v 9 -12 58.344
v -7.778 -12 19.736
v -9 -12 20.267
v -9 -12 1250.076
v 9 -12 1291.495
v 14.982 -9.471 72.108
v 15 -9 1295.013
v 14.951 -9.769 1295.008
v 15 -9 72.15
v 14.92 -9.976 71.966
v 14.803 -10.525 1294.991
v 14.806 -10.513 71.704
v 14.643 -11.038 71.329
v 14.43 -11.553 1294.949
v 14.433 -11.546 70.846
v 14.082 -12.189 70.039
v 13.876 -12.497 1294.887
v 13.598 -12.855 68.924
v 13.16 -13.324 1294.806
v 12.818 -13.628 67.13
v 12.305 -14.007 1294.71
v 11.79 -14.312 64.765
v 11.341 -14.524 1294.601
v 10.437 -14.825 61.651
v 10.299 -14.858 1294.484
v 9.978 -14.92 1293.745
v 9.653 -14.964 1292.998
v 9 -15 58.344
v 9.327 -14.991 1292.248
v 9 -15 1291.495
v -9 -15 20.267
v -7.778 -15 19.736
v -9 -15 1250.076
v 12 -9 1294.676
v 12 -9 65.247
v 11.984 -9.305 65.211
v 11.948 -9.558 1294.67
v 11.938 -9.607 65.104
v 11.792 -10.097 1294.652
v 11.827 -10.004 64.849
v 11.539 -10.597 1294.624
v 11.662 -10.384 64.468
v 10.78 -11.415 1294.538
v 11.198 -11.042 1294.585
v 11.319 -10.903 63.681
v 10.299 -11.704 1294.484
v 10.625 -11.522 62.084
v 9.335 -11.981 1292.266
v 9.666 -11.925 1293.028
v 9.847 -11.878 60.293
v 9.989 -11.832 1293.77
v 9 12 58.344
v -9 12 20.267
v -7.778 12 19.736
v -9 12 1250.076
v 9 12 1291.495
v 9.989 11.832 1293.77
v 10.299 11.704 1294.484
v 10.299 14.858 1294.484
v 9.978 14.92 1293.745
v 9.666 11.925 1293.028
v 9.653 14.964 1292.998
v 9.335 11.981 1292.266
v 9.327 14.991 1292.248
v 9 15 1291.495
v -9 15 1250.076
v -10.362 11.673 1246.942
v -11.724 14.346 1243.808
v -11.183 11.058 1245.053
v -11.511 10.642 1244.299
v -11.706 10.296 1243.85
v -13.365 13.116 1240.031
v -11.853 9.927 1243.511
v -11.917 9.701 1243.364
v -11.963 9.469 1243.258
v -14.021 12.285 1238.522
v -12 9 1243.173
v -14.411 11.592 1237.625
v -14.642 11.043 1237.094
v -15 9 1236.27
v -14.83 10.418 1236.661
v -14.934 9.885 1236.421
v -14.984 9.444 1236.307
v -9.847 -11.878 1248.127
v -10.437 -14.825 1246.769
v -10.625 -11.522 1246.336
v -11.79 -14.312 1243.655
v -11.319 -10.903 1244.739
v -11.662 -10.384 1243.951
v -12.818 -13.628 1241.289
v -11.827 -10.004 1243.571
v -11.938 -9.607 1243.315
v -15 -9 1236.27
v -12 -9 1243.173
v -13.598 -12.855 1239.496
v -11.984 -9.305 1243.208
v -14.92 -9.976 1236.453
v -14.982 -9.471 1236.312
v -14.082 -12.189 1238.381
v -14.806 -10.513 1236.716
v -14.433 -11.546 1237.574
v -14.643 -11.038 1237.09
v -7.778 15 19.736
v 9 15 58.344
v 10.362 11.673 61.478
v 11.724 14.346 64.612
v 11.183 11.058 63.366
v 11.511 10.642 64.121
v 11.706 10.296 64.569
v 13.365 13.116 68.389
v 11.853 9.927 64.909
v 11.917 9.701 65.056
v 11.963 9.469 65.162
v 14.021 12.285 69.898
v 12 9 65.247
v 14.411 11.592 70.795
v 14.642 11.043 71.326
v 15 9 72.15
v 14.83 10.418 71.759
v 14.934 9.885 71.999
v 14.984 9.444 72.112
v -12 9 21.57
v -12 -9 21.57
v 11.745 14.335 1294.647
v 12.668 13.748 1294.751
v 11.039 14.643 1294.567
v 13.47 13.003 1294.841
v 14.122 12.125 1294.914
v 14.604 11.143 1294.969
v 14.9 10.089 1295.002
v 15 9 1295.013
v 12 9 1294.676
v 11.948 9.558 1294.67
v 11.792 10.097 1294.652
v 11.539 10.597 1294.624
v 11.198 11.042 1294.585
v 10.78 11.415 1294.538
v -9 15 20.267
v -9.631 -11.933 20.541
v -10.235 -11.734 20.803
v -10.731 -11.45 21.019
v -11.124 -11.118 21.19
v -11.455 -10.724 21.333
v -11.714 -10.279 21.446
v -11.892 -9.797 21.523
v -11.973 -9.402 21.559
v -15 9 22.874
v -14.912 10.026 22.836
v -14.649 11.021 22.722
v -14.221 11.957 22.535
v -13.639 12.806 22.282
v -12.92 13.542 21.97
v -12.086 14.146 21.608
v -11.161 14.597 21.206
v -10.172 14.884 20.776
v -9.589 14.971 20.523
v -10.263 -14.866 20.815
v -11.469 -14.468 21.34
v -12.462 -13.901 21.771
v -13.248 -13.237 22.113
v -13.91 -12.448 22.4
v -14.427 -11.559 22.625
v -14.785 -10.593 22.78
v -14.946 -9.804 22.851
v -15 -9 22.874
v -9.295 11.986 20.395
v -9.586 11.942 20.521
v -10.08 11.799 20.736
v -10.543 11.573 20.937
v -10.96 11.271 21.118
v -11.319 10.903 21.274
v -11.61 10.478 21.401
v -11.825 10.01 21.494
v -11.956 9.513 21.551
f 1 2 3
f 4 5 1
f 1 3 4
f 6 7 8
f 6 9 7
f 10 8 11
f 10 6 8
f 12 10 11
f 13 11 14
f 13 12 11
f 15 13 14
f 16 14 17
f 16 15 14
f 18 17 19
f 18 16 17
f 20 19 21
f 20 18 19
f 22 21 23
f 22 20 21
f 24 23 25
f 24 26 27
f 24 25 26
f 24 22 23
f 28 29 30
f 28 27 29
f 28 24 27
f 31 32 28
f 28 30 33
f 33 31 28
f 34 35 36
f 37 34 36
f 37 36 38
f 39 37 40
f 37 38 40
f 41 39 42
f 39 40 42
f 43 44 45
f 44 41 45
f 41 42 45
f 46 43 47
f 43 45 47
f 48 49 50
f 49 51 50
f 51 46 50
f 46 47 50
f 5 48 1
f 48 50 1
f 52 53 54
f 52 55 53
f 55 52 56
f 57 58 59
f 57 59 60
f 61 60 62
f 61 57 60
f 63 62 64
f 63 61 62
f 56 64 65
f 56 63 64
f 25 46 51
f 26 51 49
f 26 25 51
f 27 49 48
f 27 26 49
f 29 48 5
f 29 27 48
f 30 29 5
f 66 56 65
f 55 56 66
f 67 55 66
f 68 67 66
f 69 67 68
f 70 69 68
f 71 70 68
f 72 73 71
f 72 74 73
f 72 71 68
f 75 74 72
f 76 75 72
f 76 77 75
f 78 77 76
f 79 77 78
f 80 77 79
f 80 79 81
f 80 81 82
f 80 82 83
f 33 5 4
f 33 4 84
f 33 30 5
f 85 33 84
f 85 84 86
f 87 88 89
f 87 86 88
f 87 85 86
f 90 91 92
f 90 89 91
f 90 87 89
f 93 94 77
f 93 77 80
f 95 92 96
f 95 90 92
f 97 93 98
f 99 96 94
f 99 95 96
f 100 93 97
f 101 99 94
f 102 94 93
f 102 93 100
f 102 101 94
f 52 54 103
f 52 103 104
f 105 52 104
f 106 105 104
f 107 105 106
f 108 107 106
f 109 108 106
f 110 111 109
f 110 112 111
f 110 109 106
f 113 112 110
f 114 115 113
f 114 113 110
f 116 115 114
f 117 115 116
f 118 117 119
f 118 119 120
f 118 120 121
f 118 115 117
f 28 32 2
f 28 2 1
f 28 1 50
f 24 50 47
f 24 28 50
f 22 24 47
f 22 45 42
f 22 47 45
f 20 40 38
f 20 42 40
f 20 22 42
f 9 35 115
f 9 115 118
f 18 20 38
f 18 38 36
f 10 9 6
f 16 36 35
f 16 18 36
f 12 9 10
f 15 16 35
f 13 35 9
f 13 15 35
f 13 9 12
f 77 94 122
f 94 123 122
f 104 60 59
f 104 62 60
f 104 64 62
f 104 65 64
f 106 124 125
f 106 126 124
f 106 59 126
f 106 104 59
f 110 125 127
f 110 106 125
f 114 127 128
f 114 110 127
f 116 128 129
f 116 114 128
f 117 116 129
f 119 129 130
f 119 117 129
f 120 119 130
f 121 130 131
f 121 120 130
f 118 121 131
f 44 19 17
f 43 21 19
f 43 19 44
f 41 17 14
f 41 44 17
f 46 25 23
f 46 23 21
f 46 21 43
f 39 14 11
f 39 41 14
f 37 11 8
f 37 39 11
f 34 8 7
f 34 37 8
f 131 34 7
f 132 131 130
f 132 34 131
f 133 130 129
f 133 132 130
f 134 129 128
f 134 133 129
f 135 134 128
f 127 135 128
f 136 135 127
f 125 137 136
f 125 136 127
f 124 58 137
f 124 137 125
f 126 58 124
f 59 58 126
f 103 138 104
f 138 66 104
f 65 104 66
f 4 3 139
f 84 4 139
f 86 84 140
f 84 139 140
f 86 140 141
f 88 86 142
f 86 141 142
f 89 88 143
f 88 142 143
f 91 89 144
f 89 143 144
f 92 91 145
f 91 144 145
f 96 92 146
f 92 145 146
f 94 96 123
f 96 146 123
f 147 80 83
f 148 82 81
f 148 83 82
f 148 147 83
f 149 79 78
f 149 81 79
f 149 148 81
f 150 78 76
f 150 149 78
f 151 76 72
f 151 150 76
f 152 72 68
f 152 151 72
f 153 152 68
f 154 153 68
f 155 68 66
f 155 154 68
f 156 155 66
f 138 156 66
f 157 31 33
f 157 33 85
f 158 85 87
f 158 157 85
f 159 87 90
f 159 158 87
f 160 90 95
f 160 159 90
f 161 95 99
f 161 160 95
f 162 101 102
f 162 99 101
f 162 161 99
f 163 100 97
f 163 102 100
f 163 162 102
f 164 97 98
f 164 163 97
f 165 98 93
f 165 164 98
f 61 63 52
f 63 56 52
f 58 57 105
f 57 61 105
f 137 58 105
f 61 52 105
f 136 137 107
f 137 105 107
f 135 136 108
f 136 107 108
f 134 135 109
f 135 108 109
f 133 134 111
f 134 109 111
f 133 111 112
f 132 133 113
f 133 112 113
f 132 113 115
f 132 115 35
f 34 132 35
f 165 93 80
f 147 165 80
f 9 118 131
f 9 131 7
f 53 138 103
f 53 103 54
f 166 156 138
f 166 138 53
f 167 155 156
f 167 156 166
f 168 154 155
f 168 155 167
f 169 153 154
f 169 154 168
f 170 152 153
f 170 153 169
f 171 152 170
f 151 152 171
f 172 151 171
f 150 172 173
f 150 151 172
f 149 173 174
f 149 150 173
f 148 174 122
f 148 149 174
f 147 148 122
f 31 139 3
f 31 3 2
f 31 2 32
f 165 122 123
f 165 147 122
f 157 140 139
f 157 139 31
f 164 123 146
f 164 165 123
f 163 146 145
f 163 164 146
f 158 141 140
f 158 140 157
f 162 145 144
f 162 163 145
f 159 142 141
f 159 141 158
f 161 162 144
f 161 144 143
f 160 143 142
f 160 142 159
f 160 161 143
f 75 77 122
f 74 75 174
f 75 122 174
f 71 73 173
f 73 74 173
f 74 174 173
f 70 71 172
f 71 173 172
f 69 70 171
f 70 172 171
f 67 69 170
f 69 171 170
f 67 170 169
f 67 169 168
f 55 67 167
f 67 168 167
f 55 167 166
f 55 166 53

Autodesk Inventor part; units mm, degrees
ref_plane "Start Plane" through (0, 0, 19.7356) normal (0, 0, 1) x (1, 0, 0)
ref_plane "End Plane" through (0, 0, 1295.0132) normal (0, 0, 1) x (1, 0, 0)
sketch "Sketch" plane through (0, 0, 0) normal (0, 0, 1) x (1, 0, 0)
  line L0 (-15, -9) -> (-15, 9)
  line L1 (-9, 15) -> (9, 15)
  line L2 (15, 9) -> (15, -9)
  line L3 (9, -15) -> (-9, -15)
  arc A0 (-15, -9) -> (-9, -15) centre (-9, -9) ccw
  arc A1 (-9, 15) -> (-15, 9) centre (-9, 9) ccw
  arc A2 (15, 9) -> (9, 15) centre (9, 9) ccw
  arc A3 (9, -15) -> (15, -9) centre (9, -9) ccw
  arc A4 (-9, 12) -> (-12, 9) centre (-9, 9) ccw
  line L4 (-9, 12) -> (9, 12)
  arc A5 (12, 9) -> (9, 12) centre (9, 9) ccw
  line L5 (12, 9) -> (12, -9)
  arc A6 (9, -12) -> (12, -9) centre (9, -9) ccw
  line L6 (9, -12) -> (-9, -12)
  arc A7 (-12, -9) -> (-9, -12) centre (-9, -9) ccw
  line L7 (-12, -9) -> (-12, 9)
  line L8 (0, 22.7397) -> (0, -22.7397) construction
  line L9 (-22.7397, 0) -> (22.7397, 0) construction
  dimension "d7" = 6
  dimension "d10" = 30
  dimension "d11" = 30
  dimension "d12" = 3
  dimension "d15" = 15
  dimension "d16" = 15
extrude "Body" add sketch "Sketch" along normal up to surface (1275.2776 mm away) from surface at 19.7356
sketch "Sketch3" plane through (0, 0, 0) normal (0, 0, 1) x (1, 0, 0)
  line L0 (0, 0) -> (10, 0)
ref_plane "Work Plane3" through (0, 0, 0) normal (0, -1, 0) x (1, 0, 0)
ref_plane "Work Plane4" through (-472.3083, -9, 221.6126) normal (-0.3985724, 0, -0.9171369) x (-0.9171369, 0, 0.3985724)
split "Split1" plane through (-472.3083, -9, 221.6126) removes the side toward (-0.3985724, 0, -0.9171369)
ref_plane "Work Plane5" through (-464.5298, 9, 201.8769) normal (-0.9171369, 0, 0.3985724) x (0.3985724, 0, 0.9171369)
split "Split2" plane through (-464.5298, 9, 201.8769) removes the side toward (-0.9171369, 0, 0.3985724)
ref_plane "Work Plane6" through (1.6776, 9, 1293.5139) normal (-0.1118382, 0, 0.9937264) x (0.9937264, 0, 0.1118382)
split "Split3" plane through (1.6776, 9, 1293.5139) removes the side toward (-0.1118382, 0, 0.9937264)
ref_plane "Work Plane7" through (584.1015, 9, 1381.6839) normal (0.9171369, 0, -0.3985724) x (-0.3985724, 0, -0.9171369)
split "Split4" plane through (584.1015, 9, 1381.6839) removes the side toward (0.9171369, 0, -0.3985724)
sketch "Sketch4" plane through (0, 0, 0) normal (0, -1, 0) x (1, 0, 0)
  line L0 (-2, 19.7356) -> (12, 19.7356) projected
  line L1 (-2, 1295.0132) -> (12, 1295.0132) projected
  dimension "d18" = 1275.2776
equation "\"d7\" = G_IR"
equation "\"d10\" = G_H"
equation "\"d11\" = G_W"
equation "\"d12\" = G_T"
equation "\"d15\" = 0.5 * d10"
equation "\"d16\" = 0.5 * d11"
equation "\"d3\" = G_L"
equation "\"G_W\" = 30"
equation "\"G_H\" = 30"
equation "\"G_T\" = 3"
equation "\"G_IR\" = 6"
equation "\"G_L\" = d18"
equation "\"G_OFFSET_START\" = -19.73564"
equation "\"G_OFFSET_END\" = -13.40653"
equation "\"d13\" = -G_OFFSET_START"
equation "\"d14\" = G_OFFSET_END + B_L"
equation "\"B_L\" = 1308.41975"
properties part number "DIN EN 10219-2 - 30 x 30 x 3  - 1275.28" material "Steel, Mild"
